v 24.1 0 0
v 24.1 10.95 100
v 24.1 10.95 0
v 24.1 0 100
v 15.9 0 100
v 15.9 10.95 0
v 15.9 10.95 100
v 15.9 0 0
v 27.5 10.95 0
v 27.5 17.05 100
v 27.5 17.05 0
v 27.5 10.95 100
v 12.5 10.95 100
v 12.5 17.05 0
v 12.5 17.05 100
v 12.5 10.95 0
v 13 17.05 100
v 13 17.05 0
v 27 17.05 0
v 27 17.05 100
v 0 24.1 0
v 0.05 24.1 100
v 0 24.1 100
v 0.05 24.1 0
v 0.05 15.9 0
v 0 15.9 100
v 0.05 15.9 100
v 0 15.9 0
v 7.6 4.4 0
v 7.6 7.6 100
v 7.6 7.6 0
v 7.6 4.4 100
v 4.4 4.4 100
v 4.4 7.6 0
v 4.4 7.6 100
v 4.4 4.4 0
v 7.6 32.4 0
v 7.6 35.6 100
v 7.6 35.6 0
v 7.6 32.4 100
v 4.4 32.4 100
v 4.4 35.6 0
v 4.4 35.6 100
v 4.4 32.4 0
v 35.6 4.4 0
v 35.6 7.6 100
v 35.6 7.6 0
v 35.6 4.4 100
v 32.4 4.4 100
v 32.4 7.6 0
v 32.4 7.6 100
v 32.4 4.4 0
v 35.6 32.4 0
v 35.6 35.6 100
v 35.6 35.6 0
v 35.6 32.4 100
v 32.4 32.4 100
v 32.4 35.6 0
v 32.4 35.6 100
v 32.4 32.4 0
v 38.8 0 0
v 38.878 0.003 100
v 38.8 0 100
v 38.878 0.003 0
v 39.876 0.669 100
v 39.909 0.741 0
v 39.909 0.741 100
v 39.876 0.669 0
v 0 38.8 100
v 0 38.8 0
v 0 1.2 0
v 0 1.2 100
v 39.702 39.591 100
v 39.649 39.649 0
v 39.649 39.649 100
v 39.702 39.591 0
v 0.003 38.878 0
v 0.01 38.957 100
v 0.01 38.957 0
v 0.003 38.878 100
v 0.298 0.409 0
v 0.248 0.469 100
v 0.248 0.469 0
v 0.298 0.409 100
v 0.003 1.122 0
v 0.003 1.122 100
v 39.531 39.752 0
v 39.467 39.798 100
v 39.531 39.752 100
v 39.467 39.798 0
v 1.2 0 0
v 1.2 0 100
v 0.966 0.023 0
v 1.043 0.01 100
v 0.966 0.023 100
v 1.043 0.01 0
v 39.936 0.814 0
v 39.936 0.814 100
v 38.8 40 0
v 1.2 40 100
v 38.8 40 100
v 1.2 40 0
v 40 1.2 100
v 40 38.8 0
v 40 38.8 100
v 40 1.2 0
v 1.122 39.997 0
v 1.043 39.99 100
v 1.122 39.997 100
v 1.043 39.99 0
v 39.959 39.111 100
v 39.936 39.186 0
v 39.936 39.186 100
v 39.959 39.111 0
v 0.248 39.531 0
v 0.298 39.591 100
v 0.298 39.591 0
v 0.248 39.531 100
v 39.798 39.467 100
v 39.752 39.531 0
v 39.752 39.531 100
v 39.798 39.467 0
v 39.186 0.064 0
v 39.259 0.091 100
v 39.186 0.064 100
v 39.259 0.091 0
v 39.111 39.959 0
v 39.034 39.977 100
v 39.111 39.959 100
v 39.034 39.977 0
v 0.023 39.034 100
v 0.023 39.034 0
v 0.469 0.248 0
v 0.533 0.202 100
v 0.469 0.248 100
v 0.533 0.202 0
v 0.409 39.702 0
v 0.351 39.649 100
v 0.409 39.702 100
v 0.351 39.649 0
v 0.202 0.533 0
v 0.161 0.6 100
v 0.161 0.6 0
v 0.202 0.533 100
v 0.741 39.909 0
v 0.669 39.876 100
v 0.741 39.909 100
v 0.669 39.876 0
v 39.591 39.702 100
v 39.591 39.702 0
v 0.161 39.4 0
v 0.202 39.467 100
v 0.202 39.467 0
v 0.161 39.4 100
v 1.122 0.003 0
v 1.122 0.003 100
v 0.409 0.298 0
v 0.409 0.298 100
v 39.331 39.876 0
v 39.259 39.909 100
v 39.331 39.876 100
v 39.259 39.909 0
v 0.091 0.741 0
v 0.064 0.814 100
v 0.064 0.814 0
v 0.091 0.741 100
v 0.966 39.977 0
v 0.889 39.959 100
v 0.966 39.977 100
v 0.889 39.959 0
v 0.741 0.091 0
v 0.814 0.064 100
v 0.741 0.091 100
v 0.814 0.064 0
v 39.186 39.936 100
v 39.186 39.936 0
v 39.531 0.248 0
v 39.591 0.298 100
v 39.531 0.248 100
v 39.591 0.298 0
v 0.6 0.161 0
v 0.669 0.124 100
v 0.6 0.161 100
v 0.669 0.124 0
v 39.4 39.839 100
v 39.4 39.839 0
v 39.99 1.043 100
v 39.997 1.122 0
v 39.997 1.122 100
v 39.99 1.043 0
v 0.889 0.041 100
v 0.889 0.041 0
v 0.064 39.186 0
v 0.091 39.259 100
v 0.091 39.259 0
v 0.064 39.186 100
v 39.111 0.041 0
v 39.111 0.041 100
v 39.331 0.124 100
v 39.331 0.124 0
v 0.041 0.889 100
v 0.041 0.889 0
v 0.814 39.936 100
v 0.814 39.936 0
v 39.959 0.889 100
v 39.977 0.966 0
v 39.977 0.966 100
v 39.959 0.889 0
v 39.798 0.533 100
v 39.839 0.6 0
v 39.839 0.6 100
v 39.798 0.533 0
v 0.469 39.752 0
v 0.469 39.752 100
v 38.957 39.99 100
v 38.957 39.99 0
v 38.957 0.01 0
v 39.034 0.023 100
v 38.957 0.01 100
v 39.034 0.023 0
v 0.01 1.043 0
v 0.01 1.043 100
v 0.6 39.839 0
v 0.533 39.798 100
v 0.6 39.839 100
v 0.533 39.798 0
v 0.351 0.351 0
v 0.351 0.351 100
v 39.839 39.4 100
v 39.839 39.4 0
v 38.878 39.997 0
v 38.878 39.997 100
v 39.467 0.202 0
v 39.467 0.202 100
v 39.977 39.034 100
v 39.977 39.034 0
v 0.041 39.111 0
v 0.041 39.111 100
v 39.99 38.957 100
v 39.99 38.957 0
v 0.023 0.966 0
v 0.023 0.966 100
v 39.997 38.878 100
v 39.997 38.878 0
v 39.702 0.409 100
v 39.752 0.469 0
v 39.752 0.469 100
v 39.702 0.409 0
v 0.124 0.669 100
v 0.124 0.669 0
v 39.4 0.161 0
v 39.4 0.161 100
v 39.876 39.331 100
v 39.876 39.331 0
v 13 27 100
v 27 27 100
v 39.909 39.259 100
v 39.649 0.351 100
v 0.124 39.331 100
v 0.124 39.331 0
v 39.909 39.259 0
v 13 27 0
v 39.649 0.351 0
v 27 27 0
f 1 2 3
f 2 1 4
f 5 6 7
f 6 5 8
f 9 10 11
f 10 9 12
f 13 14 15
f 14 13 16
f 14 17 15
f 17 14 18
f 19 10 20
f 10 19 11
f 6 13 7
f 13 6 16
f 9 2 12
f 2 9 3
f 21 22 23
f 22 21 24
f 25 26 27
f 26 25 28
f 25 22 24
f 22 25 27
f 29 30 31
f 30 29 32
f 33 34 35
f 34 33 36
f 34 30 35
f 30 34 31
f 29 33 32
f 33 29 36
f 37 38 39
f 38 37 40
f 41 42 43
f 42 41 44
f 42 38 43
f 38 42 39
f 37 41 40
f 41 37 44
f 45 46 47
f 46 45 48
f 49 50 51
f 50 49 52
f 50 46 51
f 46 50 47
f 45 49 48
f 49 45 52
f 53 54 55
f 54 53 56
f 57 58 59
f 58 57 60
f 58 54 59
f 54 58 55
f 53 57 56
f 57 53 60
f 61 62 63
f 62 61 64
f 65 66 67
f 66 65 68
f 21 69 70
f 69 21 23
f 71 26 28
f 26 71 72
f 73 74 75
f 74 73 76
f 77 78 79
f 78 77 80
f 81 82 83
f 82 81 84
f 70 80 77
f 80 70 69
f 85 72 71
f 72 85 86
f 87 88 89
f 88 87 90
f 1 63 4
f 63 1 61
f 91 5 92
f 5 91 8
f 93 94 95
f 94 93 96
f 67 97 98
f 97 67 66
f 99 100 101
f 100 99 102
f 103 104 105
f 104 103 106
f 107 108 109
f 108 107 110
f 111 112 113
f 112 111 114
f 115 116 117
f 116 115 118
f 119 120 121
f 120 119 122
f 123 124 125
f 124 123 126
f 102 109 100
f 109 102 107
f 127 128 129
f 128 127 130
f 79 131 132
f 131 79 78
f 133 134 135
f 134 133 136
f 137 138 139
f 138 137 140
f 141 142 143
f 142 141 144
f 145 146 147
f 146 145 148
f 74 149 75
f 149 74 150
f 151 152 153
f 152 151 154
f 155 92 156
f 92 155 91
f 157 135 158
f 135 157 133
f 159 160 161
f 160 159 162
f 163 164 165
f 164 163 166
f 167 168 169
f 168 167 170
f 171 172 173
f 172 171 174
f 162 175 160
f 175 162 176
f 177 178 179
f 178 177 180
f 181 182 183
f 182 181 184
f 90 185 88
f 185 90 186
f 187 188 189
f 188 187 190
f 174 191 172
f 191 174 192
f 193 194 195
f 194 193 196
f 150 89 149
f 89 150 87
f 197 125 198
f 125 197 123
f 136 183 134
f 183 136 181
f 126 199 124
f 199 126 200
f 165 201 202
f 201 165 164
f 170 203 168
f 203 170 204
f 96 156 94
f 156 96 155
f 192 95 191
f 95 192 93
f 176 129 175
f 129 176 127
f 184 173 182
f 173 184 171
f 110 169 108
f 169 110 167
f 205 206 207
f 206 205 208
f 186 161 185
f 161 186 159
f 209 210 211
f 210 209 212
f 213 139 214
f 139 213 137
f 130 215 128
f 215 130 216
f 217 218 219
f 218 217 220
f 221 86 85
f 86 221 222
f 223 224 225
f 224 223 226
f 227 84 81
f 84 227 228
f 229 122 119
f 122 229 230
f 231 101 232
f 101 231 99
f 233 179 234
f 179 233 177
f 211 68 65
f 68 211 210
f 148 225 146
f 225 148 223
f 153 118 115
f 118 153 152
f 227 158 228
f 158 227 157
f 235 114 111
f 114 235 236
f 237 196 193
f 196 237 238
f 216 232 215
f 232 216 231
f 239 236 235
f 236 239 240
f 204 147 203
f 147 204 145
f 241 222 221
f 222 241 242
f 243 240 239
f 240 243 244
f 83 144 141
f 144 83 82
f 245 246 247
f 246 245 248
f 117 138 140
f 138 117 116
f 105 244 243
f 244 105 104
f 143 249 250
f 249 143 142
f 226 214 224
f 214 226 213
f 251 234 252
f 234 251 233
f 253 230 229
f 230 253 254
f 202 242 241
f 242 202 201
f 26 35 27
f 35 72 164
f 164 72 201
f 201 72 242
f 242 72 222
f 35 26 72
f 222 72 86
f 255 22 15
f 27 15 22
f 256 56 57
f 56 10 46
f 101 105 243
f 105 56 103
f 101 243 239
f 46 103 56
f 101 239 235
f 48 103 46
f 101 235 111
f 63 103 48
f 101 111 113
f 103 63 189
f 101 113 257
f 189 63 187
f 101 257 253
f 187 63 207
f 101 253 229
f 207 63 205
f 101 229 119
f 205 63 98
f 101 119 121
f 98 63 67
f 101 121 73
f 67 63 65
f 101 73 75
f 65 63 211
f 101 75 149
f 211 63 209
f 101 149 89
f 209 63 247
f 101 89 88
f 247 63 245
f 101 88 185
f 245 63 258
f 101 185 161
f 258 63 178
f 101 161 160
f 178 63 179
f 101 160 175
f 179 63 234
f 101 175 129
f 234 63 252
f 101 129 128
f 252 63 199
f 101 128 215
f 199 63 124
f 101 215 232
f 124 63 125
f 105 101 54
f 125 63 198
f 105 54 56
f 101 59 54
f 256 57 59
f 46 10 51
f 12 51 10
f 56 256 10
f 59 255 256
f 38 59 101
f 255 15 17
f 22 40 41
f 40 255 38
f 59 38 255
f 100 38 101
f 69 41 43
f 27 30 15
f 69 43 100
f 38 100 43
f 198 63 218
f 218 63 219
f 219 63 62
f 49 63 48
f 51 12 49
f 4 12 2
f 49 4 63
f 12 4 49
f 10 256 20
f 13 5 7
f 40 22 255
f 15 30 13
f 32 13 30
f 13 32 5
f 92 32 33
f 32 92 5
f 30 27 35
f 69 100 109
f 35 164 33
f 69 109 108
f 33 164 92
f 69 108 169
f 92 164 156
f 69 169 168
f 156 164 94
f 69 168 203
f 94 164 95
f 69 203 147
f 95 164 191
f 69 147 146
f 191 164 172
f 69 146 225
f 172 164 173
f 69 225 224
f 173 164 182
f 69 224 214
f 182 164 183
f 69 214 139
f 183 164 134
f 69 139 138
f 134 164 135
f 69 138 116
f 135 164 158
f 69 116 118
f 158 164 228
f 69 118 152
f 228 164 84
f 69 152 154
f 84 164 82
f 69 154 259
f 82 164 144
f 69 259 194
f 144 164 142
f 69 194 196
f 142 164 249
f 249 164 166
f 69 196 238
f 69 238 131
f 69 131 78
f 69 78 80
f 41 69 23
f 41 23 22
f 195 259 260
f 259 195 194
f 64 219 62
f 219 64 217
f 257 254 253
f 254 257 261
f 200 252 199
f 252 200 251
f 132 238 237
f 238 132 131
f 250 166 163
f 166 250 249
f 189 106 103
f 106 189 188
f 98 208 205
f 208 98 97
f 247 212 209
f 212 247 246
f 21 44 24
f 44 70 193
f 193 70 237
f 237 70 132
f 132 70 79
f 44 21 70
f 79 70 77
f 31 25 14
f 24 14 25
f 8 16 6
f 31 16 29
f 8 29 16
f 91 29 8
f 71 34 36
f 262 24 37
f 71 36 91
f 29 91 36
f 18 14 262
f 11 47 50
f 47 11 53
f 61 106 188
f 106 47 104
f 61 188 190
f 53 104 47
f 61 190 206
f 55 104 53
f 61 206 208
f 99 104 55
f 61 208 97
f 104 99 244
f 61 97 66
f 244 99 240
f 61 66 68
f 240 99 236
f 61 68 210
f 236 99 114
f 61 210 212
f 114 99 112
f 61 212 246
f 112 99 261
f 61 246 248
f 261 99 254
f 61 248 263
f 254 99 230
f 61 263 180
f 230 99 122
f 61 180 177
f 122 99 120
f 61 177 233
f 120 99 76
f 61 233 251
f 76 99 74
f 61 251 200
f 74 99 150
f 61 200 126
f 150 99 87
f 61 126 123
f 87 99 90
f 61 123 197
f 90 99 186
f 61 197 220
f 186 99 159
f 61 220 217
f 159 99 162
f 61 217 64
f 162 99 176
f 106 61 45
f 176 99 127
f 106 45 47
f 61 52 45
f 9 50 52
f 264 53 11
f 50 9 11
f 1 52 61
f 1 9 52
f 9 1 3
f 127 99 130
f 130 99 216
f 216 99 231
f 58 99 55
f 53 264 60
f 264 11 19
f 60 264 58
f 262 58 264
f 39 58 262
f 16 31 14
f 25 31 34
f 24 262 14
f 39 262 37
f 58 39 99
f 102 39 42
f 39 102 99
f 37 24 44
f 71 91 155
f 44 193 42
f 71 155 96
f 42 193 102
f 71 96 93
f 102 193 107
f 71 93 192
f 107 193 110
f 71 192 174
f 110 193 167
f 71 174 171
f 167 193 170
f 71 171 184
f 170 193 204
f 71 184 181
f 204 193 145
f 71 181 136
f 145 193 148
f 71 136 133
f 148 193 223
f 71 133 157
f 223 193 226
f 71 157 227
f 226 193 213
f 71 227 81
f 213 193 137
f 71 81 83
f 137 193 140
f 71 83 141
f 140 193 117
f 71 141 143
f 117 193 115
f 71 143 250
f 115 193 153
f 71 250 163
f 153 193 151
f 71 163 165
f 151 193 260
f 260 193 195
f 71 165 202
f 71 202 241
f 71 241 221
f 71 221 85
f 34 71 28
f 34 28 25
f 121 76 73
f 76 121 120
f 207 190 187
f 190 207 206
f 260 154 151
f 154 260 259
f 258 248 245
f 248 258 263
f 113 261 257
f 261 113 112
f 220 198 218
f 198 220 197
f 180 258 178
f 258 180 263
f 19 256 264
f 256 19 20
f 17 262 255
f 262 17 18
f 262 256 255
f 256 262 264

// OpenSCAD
$fn = 96;

length = 100;
size   = 40;

module extrusion_4040(len=100, s=40) {
    // 40x40 aluminum extrusion (approx.) with 4 symmetric T-slots.
    // One connected solid: outer prism minus internal voids/slots.
    eps = 0.05;

    // Geometry (tuned to look like a typical 4040 profile)
    core_sq   = 14;    // central square void
    slot_open = 8.2;   // opening at the face
    slot_in   = 11.0;  // depth of narrow opening cut
    head_w    = 15.0;  // wider internal pocket width (T-head)
    head_in   = 17.0;  // depth of wider pocket from face
    corner_r  = 1.2;   // slight outer corner rounding (visual)

    // Helper: rounded square prism (keeps model robust and visible)
    module rounded_square_prism(w, h, r, z) {
        linear_extrude(height=z, center=false)
            offset(r=r)
                square([w-2*r, h-2*r], center=true);
    }

    color([0.75, 0.75, 0.78])
    difference() {
        // Outer body (centered in XY, extruded along +Z)
        translate([s/2, s/2, 0])
            rounded_square_prism(s, s, corner_r, len);

        // Central square void
        translate([s/2 - core_sq/2, s/2 - core_sq/2, -eps])
            cube([core_sq, core_sq, len + 2*eps], center=false);

        // Four symmetric T-slots (one per face)
        for (a = [0, 90, 180, 270]) {
            rotate([0, 0, a]) {
                // Narrow opening from face inward (face is at y=0 after rotation)
                translate([s/2 - slot_open/2, -eps, -eps])
                    cube([slot_open, slot_in + eps, len + 2*eps], center=false);

                // Wider internal pocket (T-head), starts at slot_in
                translate([s/2 - head_w/2, slot_in - eps, -eps])
                    cube([head_w, (head_in - slot_in) + 2*eps, len + 2*eps], center=false);
            }
        }

        // Small corner relief holes (common in many extrusions), kept inside walls
        hole = 3.2;
        inset = 6.0;
        for (ix = [inset, s - inset], iy = [inset, s - inset]) {
            translate([ix - hole/2, iy - hole/2, -eps])
                cube([hole, hole, len + 2*eps], center=false);
        }
    }
}

extrusion_4040(length, size);
